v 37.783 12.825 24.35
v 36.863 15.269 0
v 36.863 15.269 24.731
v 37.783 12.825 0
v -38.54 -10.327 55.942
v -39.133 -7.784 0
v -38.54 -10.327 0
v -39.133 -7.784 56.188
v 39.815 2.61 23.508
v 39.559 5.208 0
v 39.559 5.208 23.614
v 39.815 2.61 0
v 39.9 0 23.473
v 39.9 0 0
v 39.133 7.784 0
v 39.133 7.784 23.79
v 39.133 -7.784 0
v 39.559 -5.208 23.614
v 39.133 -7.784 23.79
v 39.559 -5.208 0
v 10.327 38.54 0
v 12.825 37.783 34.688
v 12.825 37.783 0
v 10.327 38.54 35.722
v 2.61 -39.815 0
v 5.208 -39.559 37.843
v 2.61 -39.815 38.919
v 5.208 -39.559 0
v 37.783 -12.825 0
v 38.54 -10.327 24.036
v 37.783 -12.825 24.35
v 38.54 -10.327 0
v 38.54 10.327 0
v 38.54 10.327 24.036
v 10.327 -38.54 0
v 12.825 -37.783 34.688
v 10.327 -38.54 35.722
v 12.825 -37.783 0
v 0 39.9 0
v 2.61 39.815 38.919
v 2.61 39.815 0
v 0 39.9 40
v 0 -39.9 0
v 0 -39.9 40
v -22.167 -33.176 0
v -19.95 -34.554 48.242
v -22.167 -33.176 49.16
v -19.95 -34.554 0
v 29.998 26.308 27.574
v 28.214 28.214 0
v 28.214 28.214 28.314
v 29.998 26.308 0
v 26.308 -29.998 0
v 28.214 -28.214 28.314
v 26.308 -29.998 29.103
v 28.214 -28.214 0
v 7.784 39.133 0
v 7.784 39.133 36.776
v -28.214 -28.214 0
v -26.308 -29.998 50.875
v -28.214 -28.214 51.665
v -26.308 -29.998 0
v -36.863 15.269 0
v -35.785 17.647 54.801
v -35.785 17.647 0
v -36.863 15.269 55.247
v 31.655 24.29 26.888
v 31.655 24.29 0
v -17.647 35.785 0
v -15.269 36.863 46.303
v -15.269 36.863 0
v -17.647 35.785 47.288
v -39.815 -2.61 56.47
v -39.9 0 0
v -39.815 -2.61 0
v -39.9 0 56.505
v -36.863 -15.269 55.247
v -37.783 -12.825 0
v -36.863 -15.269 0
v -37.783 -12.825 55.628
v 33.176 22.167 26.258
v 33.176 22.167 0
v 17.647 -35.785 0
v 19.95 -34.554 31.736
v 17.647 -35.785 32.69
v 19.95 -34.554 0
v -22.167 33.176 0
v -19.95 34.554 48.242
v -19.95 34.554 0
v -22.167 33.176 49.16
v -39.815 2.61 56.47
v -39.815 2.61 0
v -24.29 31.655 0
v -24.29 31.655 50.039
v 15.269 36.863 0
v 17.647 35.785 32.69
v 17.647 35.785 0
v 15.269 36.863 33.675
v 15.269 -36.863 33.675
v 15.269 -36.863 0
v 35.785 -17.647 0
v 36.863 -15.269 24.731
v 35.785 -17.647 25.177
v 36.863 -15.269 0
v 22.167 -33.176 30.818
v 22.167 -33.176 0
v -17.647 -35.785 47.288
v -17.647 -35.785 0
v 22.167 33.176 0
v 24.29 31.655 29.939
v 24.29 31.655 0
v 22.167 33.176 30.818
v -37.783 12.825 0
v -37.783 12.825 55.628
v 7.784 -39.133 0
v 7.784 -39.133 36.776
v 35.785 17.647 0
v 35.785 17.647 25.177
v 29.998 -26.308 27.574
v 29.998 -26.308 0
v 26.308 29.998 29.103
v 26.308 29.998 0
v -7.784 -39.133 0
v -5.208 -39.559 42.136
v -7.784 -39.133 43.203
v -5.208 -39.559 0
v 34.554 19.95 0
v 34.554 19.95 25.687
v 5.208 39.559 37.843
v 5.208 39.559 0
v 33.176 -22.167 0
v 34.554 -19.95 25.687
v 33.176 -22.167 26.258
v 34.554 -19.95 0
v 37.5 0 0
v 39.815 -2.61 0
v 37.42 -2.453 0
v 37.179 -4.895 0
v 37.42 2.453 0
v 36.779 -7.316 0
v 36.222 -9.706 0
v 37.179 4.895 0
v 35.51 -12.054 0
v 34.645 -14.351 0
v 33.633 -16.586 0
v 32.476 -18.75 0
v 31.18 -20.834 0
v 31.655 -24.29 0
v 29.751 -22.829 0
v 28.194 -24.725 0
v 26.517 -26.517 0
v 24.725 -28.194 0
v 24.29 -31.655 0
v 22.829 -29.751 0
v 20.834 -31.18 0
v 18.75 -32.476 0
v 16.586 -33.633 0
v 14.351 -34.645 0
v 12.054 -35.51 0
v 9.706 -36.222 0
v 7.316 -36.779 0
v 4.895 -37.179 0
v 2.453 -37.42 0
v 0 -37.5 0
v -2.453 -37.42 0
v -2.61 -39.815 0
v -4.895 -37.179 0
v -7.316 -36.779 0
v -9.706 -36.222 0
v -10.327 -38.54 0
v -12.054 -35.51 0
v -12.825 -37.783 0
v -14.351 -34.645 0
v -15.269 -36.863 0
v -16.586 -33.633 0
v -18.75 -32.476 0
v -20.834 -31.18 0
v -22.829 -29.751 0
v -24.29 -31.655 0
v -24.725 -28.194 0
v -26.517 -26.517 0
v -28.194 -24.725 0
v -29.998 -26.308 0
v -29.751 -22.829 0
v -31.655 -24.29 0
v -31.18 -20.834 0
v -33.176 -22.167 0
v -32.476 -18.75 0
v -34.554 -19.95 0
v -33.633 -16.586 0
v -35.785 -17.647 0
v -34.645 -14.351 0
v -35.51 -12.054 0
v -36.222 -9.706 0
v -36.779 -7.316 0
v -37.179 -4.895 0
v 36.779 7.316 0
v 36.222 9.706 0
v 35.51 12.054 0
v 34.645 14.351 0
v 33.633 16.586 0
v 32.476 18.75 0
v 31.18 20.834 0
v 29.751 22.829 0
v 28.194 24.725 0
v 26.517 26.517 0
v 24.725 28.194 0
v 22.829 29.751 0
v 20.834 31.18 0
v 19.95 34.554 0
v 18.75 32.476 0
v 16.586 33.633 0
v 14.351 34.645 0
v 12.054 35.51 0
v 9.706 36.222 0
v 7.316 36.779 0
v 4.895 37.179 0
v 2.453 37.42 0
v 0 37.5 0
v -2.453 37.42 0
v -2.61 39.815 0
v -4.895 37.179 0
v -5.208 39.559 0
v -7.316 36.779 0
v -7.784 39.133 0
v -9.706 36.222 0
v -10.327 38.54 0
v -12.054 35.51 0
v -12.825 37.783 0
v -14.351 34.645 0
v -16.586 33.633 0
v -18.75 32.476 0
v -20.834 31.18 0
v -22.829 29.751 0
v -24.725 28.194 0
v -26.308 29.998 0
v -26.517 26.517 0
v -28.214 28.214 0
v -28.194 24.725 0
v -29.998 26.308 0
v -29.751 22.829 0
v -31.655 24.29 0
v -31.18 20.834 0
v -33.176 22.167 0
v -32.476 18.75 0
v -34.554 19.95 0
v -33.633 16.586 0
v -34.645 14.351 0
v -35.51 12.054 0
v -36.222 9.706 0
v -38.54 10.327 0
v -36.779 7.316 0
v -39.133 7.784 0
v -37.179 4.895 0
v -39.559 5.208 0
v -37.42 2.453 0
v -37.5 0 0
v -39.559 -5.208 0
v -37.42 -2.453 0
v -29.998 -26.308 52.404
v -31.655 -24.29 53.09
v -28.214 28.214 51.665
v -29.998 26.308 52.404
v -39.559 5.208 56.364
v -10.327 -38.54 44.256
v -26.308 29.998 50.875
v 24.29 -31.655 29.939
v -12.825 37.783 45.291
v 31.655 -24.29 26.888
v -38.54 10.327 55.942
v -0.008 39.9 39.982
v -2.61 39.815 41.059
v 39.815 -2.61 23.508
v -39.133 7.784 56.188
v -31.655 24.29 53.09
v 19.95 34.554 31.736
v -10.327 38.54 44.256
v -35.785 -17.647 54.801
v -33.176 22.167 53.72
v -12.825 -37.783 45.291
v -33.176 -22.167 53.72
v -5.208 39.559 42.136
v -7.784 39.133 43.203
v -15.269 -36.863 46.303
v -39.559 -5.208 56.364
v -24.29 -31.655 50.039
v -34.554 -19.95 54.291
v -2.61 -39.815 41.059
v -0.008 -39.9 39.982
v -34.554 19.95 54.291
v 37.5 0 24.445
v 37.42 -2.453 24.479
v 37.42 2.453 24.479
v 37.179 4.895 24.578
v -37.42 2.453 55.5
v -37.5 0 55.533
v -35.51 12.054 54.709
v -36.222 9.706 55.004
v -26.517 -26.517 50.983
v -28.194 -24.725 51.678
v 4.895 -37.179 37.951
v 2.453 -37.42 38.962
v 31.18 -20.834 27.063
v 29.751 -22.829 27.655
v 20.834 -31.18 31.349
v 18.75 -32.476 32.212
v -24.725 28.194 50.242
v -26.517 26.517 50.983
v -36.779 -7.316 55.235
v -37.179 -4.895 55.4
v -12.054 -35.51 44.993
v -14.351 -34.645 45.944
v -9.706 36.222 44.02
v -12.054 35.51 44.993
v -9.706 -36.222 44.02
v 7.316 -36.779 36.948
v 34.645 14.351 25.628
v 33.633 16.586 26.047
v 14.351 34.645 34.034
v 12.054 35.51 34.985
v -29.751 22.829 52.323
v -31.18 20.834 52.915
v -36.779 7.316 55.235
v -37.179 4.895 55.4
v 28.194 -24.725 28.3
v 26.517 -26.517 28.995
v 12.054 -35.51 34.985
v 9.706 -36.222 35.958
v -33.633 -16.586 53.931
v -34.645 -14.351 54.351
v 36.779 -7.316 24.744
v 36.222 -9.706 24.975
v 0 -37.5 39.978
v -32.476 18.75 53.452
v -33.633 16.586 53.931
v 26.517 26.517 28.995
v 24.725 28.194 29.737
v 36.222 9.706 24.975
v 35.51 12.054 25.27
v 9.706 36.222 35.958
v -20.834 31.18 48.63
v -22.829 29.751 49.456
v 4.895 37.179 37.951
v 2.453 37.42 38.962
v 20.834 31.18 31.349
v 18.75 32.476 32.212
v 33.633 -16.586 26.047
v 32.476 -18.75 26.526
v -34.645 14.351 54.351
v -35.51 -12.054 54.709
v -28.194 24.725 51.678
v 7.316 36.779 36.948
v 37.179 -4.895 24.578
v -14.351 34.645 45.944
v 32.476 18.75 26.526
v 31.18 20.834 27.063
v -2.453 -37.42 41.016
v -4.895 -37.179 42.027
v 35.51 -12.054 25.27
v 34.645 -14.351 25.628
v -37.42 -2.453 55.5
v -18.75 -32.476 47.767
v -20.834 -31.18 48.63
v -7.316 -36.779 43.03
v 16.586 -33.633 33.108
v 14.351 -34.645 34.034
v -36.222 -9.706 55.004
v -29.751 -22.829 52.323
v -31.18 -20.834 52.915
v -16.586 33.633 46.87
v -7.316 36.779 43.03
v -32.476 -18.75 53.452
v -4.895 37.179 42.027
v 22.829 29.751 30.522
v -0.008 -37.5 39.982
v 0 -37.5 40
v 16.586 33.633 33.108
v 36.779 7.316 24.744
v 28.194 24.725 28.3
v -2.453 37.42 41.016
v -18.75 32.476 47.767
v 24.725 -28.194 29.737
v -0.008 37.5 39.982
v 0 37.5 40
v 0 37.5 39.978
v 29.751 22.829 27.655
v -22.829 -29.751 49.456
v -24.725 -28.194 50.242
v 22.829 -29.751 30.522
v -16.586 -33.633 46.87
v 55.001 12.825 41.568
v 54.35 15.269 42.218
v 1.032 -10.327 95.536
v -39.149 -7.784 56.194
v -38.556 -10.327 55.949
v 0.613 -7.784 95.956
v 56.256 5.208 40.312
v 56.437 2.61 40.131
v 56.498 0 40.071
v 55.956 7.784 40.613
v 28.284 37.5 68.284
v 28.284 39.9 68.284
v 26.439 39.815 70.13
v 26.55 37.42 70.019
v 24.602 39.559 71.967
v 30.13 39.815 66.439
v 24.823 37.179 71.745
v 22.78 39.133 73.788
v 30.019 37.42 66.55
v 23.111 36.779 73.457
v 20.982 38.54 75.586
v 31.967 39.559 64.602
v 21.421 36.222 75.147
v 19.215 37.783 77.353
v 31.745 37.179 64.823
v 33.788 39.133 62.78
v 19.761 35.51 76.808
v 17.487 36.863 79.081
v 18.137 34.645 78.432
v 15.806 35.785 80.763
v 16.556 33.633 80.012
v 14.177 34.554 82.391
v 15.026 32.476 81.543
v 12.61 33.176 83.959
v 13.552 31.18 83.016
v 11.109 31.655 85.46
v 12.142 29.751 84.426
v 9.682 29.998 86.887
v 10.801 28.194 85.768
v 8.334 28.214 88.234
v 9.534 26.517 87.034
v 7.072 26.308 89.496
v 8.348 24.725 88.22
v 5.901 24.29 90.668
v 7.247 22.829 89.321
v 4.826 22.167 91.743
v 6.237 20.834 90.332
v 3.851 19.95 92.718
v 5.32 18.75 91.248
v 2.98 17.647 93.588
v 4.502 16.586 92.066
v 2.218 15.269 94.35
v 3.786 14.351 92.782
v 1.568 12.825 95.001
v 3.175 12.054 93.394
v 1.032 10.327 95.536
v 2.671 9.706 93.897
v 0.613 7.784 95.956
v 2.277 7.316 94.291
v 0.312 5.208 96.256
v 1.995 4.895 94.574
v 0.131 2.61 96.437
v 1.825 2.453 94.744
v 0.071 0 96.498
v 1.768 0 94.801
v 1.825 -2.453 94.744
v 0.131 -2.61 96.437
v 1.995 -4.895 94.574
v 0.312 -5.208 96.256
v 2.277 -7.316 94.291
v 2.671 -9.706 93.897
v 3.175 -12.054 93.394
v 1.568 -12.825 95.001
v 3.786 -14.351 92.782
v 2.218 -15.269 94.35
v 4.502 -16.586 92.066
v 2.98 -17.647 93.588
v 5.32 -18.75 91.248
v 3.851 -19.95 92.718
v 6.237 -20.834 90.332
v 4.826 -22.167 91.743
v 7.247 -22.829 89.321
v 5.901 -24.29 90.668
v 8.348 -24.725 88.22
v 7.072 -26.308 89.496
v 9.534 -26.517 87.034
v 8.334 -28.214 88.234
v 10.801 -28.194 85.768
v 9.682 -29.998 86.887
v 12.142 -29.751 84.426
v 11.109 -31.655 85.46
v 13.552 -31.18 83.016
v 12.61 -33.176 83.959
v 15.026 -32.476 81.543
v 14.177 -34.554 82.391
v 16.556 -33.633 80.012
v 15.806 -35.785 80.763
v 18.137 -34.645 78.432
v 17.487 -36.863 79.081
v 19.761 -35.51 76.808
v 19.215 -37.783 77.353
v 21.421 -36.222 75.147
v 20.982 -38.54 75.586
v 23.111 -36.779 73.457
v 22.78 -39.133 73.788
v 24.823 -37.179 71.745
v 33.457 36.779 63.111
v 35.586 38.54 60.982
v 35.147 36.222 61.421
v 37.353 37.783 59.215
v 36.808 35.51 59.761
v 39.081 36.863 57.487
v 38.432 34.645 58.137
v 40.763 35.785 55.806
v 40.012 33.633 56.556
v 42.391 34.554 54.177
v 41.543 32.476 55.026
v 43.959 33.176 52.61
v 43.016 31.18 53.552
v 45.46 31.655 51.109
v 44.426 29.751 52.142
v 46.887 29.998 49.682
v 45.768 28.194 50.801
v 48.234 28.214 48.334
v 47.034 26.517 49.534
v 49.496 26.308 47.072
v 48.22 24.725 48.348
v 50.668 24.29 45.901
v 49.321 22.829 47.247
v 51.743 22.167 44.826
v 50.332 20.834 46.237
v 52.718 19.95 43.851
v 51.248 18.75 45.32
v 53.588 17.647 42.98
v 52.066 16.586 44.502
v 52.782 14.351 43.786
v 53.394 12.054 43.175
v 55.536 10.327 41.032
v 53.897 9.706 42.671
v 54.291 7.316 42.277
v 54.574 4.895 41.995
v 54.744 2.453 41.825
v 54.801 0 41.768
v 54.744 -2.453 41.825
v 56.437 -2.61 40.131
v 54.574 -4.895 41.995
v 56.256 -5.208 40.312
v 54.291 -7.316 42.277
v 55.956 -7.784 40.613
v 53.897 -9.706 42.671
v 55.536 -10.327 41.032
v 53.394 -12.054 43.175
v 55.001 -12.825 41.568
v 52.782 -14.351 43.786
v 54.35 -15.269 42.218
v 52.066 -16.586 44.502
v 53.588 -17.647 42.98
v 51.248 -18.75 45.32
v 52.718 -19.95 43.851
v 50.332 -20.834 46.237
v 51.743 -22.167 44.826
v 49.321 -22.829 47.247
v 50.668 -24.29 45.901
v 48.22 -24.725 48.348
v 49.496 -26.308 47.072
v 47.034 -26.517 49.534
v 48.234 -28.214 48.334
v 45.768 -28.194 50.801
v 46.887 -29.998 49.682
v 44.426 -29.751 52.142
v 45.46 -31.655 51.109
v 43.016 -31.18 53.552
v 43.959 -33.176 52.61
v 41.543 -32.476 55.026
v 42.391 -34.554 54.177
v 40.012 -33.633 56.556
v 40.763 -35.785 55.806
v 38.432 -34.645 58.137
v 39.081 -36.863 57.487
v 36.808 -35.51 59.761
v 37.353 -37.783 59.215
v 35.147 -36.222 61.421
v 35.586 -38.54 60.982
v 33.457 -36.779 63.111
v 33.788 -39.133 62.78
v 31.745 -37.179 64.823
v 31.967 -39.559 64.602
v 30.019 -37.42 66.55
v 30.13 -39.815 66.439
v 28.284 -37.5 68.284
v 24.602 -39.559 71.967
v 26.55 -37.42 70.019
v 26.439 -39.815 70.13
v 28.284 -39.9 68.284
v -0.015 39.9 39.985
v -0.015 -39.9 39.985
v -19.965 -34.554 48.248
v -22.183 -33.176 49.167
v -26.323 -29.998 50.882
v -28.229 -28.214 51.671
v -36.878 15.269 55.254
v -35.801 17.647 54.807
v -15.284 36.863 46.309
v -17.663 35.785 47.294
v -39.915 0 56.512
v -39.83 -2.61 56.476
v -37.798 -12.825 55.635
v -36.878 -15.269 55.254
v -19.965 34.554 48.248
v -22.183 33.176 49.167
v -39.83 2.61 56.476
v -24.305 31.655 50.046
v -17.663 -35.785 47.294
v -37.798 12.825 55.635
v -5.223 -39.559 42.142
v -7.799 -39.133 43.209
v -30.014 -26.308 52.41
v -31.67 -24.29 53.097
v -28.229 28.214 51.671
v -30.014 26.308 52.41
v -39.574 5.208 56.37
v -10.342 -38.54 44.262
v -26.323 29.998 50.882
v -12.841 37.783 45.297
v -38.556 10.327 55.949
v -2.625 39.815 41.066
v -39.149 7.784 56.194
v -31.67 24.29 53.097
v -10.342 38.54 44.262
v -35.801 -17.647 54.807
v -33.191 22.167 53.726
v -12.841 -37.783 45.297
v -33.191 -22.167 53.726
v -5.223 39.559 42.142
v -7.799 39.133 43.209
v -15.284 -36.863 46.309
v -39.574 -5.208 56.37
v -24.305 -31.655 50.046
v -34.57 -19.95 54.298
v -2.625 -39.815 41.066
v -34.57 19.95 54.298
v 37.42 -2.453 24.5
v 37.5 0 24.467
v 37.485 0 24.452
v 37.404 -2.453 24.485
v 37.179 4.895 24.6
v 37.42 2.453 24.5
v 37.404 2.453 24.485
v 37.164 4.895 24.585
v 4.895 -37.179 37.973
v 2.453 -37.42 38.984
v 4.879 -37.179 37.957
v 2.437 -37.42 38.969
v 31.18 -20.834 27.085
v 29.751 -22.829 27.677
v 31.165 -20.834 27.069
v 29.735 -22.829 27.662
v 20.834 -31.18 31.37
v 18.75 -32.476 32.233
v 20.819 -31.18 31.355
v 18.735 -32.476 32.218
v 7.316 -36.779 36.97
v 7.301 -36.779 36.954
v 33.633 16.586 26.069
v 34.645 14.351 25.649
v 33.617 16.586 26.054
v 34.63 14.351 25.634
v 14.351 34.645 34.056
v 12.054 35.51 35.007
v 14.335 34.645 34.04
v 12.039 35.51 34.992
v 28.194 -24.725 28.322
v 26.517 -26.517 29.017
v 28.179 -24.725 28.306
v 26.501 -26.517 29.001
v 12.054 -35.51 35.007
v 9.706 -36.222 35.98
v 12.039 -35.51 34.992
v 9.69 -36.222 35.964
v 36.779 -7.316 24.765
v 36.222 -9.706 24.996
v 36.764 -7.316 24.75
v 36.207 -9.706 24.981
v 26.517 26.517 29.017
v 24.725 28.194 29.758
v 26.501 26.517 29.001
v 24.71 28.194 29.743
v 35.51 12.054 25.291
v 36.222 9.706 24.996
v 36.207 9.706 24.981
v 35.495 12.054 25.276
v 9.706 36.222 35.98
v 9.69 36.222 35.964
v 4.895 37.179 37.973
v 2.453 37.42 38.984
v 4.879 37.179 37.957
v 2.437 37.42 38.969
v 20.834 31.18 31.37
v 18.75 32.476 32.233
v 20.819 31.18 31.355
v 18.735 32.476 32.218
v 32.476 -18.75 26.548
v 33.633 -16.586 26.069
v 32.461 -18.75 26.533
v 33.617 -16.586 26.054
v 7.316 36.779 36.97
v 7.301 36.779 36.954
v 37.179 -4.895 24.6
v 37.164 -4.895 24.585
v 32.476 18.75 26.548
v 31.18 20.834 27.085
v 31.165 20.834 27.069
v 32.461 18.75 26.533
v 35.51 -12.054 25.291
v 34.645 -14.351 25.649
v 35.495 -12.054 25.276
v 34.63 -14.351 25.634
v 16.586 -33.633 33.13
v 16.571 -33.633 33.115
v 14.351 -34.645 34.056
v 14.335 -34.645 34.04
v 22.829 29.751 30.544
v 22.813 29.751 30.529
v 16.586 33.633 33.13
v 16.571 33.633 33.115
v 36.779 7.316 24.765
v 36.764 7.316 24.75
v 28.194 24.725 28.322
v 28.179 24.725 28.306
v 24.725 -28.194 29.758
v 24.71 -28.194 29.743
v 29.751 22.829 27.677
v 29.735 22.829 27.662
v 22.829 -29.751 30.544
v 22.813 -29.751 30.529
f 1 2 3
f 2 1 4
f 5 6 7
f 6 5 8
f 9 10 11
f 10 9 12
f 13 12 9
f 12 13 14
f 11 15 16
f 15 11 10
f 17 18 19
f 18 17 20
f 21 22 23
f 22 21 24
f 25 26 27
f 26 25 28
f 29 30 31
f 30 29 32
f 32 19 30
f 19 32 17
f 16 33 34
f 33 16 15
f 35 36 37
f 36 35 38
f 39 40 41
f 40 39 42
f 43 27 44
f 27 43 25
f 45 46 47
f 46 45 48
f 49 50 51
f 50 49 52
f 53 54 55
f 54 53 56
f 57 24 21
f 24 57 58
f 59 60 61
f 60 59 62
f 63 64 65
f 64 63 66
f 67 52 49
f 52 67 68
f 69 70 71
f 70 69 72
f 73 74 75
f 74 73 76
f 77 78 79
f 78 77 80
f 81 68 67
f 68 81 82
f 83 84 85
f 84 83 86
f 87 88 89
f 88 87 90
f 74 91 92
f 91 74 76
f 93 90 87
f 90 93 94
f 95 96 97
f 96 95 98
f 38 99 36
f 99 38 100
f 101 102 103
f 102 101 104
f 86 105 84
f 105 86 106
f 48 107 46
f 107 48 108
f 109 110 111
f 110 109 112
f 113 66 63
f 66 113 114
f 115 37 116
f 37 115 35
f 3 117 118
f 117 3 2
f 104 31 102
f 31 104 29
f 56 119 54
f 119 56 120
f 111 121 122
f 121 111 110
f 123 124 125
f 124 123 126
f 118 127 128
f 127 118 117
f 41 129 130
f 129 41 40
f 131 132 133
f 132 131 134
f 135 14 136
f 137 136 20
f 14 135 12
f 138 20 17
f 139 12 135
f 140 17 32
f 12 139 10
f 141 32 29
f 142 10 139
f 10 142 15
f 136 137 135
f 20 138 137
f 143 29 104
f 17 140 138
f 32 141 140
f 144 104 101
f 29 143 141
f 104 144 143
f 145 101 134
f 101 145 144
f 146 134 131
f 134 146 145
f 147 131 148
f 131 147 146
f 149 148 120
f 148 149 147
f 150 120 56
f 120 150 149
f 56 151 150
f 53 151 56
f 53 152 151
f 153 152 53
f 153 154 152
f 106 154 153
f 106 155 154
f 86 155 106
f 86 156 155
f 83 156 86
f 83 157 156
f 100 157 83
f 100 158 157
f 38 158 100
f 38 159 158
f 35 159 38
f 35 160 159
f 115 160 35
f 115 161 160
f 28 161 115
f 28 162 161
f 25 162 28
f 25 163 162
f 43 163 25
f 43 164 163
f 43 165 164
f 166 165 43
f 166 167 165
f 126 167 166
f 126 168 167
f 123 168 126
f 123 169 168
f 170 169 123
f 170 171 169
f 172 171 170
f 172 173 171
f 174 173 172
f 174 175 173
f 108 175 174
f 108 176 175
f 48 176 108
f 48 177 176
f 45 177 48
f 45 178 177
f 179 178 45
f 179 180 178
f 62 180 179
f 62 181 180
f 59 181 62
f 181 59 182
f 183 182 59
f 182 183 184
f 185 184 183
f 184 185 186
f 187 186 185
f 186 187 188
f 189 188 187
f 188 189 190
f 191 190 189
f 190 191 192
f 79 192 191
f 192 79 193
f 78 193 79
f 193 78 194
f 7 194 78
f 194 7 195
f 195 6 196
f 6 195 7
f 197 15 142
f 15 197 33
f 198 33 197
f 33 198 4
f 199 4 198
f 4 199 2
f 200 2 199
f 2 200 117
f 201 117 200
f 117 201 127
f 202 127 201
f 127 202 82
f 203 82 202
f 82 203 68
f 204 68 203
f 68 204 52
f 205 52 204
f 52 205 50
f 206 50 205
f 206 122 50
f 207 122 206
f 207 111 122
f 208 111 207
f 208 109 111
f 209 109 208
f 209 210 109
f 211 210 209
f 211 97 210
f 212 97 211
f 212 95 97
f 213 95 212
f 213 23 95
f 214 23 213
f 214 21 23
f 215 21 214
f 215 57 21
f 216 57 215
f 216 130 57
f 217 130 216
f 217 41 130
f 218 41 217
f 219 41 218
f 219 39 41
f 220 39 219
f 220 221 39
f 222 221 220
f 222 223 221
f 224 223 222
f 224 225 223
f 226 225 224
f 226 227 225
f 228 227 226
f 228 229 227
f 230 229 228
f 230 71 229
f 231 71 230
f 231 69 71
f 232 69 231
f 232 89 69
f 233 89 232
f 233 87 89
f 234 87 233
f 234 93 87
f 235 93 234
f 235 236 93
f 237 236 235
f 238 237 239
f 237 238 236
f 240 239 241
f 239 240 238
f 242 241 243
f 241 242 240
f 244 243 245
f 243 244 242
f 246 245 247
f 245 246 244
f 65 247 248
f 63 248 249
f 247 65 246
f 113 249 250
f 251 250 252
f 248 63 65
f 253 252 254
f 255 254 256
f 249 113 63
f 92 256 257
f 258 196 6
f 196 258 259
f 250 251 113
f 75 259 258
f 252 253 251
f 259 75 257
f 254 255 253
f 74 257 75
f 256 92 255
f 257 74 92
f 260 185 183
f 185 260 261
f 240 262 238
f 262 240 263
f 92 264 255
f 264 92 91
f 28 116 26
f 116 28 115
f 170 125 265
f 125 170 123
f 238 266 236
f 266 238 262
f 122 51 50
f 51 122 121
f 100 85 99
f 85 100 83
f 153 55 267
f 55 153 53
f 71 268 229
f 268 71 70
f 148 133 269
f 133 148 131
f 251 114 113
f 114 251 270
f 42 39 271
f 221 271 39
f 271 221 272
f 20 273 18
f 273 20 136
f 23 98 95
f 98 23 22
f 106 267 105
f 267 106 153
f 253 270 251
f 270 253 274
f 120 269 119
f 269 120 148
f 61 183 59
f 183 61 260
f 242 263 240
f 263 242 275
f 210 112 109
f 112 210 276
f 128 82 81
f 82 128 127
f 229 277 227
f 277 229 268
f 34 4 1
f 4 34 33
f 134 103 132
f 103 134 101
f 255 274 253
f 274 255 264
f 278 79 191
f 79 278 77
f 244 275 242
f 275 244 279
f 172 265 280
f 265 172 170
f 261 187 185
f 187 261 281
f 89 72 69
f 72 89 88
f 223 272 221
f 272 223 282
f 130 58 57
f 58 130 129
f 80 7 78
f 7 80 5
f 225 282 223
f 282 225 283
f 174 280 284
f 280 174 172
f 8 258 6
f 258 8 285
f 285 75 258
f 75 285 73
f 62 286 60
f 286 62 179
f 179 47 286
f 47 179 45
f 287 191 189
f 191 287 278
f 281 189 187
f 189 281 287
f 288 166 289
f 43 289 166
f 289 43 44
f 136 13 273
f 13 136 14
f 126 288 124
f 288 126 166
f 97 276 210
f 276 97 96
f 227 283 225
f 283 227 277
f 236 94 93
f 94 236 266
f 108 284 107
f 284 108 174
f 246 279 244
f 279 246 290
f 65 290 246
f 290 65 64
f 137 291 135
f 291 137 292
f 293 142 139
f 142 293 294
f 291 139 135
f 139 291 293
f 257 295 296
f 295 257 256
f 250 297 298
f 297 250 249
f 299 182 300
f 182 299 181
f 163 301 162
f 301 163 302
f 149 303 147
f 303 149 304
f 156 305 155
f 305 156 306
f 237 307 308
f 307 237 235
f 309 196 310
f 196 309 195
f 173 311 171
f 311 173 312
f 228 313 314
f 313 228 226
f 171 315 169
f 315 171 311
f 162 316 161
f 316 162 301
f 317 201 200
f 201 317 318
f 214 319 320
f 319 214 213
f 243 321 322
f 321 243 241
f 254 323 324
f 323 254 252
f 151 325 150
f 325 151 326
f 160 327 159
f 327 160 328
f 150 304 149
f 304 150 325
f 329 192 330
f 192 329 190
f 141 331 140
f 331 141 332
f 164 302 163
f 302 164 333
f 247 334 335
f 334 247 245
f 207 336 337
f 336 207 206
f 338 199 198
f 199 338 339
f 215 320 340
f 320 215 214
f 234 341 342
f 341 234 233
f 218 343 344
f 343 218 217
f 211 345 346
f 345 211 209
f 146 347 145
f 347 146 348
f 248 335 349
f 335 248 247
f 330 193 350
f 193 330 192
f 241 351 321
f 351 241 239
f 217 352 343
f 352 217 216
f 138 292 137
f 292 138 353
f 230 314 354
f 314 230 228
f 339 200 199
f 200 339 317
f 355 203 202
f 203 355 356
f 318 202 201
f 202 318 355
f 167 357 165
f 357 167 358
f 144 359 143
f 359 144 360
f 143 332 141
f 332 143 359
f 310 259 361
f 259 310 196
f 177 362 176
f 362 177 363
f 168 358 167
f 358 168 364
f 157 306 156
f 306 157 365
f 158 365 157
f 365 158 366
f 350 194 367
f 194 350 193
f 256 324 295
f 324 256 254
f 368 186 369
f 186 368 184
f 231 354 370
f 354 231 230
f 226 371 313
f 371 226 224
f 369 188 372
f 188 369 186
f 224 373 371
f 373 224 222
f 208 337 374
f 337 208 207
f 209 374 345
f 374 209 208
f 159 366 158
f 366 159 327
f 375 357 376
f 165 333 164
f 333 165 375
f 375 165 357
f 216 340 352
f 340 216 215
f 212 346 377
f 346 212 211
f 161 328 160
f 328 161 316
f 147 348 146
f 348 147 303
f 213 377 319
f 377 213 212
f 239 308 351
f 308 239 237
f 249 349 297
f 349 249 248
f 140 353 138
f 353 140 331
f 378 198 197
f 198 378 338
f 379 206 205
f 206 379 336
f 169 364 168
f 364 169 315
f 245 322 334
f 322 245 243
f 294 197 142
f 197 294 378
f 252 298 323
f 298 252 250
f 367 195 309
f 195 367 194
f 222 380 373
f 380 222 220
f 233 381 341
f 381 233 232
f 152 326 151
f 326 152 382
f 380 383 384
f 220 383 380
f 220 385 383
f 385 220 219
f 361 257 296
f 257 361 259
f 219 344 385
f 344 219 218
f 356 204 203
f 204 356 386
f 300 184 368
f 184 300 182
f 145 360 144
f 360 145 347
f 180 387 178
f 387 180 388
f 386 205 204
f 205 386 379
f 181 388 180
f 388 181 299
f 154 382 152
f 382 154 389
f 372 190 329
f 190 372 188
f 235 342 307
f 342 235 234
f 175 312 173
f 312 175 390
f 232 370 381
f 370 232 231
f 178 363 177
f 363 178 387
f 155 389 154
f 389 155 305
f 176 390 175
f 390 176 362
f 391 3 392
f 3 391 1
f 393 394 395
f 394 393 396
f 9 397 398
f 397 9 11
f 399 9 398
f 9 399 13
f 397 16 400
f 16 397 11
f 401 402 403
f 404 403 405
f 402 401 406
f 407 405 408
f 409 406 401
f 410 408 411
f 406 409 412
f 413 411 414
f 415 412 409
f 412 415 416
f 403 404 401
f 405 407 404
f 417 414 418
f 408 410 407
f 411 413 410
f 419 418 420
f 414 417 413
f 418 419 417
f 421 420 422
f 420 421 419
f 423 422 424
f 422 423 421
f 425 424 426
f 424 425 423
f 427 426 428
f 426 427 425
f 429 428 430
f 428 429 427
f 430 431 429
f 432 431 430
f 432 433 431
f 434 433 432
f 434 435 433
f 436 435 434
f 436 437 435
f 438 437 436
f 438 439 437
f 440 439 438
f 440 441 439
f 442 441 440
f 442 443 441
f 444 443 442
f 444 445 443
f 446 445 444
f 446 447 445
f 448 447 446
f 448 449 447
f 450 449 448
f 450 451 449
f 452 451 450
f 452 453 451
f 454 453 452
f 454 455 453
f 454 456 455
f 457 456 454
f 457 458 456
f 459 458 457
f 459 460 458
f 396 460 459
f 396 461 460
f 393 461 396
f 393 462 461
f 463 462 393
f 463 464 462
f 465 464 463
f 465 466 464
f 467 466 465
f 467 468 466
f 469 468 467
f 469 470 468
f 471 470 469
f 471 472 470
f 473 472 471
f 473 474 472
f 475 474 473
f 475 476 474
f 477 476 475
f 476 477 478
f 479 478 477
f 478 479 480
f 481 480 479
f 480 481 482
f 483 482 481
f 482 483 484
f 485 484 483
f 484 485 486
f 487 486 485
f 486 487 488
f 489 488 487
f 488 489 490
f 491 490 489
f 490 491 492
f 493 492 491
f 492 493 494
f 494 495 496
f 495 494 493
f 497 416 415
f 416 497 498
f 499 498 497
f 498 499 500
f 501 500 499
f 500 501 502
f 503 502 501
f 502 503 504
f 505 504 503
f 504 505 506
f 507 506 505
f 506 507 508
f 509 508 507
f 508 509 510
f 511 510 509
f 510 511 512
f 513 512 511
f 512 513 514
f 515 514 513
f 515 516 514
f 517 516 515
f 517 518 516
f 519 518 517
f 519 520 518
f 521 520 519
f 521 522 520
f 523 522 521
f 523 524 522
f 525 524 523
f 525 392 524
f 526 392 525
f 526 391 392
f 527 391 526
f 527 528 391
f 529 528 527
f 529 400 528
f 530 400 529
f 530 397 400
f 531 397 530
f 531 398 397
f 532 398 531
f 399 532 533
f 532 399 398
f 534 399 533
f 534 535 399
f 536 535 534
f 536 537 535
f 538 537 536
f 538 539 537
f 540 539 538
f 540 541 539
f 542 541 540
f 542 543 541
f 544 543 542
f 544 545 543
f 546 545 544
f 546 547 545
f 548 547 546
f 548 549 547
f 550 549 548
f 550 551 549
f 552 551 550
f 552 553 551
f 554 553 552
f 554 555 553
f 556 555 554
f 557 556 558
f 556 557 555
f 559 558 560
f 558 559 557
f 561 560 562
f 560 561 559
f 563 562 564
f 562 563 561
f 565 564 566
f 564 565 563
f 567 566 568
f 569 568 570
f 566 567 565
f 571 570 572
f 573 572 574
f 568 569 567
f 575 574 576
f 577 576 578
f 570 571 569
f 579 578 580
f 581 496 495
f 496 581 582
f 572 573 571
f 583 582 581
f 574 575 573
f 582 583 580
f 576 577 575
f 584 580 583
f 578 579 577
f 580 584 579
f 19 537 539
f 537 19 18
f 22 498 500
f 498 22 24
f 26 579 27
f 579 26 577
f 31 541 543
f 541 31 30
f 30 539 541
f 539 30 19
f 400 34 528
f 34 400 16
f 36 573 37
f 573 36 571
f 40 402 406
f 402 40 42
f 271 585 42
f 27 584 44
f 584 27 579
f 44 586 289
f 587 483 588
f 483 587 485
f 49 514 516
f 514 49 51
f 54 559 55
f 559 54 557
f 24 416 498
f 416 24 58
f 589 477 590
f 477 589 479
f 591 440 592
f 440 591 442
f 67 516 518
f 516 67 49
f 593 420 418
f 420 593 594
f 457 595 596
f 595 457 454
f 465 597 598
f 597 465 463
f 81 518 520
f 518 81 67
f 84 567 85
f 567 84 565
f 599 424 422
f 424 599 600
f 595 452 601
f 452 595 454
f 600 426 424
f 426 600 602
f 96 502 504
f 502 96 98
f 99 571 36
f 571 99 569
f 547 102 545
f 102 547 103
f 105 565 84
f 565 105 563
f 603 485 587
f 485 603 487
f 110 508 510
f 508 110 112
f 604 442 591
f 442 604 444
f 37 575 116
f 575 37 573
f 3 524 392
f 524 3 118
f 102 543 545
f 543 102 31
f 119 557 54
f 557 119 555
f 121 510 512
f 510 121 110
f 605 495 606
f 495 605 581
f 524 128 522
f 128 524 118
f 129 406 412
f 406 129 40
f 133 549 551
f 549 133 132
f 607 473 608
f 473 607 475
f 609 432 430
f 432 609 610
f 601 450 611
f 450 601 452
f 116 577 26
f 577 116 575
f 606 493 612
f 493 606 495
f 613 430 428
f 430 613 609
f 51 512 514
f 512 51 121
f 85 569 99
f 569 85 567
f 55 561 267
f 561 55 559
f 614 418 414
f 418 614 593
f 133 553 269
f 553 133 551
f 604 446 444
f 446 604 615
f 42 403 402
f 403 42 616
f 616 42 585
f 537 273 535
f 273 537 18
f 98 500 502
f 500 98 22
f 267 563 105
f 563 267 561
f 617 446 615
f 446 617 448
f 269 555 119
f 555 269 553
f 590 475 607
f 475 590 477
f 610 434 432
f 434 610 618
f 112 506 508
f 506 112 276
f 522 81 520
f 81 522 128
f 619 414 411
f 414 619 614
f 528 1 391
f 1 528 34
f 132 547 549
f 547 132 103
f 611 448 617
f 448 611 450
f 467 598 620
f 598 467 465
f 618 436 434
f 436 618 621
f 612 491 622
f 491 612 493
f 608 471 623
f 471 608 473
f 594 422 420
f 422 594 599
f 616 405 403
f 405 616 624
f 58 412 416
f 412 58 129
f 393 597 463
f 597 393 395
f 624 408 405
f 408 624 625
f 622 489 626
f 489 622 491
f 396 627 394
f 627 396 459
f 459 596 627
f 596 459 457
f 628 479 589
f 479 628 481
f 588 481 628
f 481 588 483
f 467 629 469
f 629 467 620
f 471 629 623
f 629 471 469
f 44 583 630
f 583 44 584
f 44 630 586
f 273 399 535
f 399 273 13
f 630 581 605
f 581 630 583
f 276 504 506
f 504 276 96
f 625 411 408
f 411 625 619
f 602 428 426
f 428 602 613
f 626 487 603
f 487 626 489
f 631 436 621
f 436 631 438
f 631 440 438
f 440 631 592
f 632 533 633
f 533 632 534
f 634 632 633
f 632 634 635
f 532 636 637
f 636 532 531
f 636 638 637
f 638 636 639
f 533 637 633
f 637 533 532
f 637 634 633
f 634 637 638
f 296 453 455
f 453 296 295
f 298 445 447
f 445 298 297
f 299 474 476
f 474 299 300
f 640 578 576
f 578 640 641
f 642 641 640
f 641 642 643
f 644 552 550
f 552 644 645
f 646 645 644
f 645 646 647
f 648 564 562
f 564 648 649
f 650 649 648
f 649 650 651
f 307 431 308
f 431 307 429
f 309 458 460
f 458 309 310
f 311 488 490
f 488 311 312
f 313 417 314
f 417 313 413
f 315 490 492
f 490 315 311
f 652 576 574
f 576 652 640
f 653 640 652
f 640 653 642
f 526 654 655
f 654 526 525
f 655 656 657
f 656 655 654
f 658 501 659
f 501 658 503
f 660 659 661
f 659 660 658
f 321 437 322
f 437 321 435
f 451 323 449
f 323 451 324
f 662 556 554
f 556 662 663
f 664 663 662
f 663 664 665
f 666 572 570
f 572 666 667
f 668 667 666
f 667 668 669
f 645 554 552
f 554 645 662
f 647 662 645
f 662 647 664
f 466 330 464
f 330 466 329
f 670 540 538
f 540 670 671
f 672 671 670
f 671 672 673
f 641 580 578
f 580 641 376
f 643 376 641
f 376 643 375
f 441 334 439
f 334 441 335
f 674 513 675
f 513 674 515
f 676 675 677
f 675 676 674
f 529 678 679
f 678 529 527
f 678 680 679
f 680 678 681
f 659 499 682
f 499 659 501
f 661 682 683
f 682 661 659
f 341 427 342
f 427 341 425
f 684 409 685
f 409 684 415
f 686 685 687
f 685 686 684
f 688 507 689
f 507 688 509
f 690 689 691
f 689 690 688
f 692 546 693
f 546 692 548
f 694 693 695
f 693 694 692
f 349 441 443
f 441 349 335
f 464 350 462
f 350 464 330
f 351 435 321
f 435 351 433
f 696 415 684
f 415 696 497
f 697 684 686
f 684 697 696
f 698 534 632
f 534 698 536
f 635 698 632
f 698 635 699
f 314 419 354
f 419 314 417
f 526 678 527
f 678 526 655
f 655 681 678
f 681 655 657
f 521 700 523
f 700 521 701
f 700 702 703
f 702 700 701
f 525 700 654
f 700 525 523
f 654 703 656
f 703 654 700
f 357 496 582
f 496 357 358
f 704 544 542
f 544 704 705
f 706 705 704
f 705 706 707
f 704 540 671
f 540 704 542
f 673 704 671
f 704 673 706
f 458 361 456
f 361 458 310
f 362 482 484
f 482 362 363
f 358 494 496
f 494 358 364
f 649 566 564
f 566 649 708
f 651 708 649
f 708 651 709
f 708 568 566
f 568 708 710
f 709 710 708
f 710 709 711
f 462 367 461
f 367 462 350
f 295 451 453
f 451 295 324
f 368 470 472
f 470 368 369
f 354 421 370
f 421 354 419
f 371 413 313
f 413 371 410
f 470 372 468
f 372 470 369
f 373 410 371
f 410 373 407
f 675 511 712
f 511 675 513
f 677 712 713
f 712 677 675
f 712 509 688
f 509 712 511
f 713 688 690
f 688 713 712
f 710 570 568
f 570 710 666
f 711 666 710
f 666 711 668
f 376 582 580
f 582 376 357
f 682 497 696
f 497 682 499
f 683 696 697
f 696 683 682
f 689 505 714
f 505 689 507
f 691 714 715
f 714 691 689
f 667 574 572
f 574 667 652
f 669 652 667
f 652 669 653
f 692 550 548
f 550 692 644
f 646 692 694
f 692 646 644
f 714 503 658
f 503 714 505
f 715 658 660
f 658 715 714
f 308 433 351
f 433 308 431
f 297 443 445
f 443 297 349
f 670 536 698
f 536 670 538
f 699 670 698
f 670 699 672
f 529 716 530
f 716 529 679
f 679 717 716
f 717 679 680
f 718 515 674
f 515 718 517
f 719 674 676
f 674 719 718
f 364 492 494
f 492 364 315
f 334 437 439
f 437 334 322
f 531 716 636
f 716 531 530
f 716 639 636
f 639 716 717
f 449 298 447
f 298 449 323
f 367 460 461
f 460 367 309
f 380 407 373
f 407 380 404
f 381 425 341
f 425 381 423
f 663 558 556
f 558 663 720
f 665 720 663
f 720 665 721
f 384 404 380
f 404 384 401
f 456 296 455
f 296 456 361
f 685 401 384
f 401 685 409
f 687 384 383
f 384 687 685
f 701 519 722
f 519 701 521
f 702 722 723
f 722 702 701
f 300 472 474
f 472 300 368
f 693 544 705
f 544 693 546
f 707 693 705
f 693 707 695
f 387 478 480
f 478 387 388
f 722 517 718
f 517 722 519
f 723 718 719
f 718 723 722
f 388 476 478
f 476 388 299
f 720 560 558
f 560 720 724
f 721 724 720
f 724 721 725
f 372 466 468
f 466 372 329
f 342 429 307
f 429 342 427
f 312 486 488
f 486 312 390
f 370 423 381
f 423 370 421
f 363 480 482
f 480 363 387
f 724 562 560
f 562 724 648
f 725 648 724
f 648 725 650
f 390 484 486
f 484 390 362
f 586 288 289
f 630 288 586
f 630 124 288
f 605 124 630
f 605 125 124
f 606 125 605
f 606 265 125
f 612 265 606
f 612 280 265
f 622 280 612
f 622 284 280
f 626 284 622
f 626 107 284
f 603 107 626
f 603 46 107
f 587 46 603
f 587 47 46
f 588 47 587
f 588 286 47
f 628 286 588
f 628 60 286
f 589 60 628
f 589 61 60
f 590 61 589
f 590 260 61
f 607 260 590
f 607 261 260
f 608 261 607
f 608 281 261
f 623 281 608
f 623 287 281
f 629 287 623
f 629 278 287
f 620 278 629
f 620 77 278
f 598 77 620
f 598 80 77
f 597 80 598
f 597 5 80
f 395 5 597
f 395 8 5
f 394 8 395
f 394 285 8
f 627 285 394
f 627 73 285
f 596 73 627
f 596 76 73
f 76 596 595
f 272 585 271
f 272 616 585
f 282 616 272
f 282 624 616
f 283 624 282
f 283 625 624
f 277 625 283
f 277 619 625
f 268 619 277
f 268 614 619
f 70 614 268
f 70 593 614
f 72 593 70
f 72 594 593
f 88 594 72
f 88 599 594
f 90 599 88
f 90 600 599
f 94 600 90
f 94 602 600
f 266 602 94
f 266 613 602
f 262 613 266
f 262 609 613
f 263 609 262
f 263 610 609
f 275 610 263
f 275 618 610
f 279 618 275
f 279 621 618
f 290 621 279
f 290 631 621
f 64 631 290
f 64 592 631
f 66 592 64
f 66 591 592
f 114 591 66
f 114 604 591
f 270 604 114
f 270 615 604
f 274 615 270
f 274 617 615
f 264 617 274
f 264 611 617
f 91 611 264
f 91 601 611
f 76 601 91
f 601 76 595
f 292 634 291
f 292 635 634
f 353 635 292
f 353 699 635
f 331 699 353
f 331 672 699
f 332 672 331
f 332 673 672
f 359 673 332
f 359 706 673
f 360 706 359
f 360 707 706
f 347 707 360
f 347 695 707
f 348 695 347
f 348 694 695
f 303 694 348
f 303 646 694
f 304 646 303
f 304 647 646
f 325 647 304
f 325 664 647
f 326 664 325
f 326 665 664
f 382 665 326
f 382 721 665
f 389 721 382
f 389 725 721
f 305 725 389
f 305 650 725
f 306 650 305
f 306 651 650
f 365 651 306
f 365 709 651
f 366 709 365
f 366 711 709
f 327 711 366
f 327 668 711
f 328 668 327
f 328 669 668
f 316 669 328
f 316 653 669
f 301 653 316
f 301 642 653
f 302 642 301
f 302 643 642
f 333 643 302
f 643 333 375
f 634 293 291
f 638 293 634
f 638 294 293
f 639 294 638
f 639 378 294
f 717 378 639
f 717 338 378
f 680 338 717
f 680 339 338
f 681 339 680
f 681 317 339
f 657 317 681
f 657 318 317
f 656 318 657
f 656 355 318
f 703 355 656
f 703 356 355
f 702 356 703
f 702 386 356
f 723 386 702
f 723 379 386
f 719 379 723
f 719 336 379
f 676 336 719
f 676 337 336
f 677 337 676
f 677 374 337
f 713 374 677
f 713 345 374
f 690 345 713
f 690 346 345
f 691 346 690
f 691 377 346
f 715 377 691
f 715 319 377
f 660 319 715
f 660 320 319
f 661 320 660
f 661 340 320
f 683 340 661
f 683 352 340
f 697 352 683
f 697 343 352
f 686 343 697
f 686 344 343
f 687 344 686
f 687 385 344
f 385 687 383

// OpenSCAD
bore = 75; wall = 2.4; $fn = 96; BIG = 500;
ro = bore/2 + wall; ri = bore/2;
part = "bend45"; angle = 45; la = 40; lb = 40;

module tube(l) { difference() { cylinder(r=ro,h=l); translate([0,0,-1]) cylinder(r=ri,h=l+2); } }
module hs_below(t) { rotate([0,t,0]) translate([0,0,-BIG/2]) cube(BIG, center=true); }
module hs_above(t) { rotate([0,t,0]) translate([0,0, BIG/2 - 0.02]) cube(BIG, center=true); }

// Mitred bend: two straight legs meeting on a plane that bisects the bend.
// Printed standing on the inlet flange, the outlet leg leans back by `angle`.
module bend(a, la, lb) {
    translate([0,0,la]) union() {
        intersection() { translate([0,0,-la]) tube(la + BIG/2); hs_below(a/2); }
        intersection() { rotate([0,a,0]) translate([0,0,-BIG/2]) tube(lb + BIG/2); hs_above(a/2); }
    }
}
bend(angle, la, lb);
